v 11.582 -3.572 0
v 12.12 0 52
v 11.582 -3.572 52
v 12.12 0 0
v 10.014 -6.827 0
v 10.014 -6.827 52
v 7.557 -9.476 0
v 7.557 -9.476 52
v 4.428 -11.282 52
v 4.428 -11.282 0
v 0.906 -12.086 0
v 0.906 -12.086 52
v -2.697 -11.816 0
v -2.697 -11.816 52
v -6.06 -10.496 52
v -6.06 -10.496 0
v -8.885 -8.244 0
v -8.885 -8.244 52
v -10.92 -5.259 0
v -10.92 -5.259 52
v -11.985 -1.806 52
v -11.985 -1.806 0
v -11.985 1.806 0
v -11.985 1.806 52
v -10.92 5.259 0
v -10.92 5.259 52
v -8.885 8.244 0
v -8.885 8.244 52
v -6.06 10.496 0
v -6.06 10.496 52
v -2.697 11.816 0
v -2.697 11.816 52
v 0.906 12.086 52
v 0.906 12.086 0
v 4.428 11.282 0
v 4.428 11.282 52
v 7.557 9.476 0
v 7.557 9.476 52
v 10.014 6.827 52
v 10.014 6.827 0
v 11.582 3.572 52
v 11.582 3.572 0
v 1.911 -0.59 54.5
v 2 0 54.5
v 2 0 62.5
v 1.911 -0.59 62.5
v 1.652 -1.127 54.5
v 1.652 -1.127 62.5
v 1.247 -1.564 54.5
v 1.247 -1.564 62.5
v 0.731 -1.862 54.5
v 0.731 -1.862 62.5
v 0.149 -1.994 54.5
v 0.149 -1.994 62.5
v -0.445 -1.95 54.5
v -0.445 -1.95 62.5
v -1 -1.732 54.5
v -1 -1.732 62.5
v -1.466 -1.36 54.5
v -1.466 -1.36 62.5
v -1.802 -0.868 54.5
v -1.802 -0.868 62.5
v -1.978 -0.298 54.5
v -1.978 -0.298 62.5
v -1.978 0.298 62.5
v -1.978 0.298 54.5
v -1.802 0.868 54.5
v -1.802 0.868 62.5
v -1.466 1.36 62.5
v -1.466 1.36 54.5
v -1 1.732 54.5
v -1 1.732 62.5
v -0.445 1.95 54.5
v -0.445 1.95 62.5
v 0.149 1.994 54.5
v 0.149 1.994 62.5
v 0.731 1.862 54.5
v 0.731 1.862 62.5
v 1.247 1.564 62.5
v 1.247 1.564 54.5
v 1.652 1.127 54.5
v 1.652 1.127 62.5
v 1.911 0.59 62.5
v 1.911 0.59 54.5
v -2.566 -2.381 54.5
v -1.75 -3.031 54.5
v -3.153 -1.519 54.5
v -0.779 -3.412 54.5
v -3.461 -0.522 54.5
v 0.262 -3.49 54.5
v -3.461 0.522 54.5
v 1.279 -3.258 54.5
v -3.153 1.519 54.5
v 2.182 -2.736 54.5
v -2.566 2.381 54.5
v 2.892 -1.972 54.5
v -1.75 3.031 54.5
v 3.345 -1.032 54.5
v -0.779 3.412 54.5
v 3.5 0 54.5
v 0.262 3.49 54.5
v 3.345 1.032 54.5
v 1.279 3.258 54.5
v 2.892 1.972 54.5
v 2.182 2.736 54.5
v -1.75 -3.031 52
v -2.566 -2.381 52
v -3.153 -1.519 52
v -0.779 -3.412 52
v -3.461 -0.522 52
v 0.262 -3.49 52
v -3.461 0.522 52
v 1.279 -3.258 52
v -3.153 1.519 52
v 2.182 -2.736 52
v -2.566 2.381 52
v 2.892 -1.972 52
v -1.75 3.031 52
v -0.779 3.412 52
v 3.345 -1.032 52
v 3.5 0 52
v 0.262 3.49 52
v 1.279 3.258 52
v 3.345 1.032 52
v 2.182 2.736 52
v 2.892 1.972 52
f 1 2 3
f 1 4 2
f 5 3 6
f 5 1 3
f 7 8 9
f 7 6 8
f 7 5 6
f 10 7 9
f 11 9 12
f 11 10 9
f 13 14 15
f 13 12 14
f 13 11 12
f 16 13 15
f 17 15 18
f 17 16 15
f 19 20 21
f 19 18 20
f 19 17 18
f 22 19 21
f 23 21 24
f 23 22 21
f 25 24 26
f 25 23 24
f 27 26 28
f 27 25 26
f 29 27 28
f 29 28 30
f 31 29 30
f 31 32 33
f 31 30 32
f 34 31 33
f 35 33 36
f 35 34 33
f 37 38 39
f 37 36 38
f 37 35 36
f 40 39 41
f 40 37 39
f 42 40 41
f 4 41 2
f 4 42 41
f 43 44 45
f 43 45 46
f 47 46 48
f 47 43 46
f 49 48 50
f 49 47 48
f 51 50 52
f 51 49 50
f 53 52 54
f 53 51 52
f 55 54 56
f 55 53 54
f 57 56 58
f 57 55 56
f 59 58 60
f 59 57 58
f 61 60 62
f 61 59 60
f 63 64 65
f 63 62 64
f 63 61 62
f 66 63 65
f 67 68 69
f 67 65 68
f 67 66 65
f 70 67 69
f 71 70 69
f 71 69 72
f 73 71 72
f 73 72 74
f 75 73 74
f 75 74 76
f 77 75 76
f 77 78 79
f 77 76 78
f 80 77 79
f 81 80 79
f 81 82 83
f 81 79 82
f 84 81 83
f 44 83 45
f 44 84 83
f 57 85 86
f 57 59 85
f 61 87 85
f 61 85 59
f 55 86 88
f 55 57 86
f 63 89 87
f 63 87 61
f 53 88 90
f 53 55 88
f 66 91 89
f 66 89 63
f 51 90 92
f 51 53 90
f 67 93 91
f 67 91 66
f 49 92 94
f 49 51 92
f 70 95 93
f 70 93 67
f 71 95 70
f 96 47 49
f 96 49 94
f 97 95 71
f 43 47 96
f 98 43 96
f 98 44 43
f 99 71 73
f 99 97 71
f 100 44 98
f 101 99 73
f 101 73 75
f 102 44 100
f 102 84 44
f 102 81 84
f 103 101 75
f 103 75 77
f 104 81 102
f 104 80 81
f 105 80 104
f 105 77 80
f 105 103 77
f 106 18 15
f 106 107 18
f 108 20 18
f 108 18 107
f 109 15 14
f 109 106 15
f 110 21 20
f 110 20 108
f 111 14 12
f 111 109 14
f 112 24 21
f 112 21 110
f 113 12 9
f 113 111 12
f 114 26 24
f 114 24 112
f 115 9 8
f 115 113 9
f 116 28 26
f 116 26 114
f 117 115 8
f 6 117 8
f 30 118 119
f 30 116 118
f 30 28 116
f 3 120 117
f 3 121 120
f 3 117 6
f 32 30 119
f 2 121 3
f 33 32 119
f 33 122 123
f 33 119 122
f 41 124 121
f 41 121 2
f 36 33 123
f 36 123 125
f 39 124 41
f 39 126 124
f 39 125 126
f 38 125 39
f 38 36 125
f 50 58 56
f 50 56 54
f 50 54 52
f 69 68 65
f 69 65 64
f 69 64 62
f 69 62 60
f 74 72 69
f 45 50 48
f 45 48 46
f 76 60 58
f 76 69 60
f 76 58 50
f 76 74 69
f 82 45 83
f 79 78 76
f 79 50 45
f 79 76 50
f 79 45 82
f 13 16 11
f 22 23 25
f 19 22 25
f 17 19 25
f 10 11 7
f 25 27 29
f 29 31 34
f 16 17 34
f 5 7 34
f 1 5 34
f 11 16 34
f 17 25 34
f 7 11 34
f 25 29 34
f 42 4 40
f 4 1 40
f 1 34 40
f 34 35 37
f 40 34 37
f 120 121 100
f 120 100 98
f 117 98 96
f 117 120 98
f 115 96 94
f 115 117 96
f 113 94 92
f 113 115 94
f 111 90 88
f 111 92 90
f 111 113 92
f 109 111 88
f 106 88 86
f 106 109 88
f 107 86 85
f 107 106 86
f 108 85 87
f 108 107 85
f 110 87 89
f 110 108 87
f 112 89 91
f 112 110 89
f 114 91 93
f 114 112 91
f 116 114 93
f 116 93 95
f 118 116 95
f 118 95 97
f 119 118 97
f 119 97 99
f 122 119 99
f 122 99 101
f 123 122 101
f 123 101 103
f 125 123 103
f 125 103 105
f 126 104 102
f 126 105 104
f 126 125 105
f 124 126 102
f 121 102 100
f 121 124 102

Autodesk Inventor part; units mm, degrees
ref_plane "YZ Plane" through (0, 0, 0) normal (1, 0, 0) x (0, 1, 0)
ref_plane "XZ Plane" through (0, 0, 0) normal (0, 1, 0) x (-1, 0, 0)
ref_plane "XY Plane" through (0, 0, 0) normal (0, 0, 1) x (1, 0, 0)
sketch "Sketch1" plane through (0, 0, 0) normal (0, 0, 1) x (1, 0, 0)
  circle A0 centre (0, 0) radius 12.12
  dimension "d0" = 24.24
extrude "Extrusion1" add sketch "Sketch1" along normal blind 52
sketch "Sketch2" plane through (0, 0, 52) normal (0, 0, 1) x (1, 0, 0)
  circle A0 centre (0, 0) radius 3.5
  dimension "d3" = 7
extrude "Extrusion2" add sketch "Sketch2" along normal blind 2.5
sketch "Sketch3" plane through (0, 0, 54.5) normal (0, 0, 1) x (1, 0, 0)
  circle A0 centre (0, 0) radius 3.5 projected
  circle A1 centre (0, 0) radius 2
  dimension "d6" = 4
extrude "Extrusion3" add sketch "Sketch3" along normal blind 8 contours A1
properties part number "Motorreductor"
